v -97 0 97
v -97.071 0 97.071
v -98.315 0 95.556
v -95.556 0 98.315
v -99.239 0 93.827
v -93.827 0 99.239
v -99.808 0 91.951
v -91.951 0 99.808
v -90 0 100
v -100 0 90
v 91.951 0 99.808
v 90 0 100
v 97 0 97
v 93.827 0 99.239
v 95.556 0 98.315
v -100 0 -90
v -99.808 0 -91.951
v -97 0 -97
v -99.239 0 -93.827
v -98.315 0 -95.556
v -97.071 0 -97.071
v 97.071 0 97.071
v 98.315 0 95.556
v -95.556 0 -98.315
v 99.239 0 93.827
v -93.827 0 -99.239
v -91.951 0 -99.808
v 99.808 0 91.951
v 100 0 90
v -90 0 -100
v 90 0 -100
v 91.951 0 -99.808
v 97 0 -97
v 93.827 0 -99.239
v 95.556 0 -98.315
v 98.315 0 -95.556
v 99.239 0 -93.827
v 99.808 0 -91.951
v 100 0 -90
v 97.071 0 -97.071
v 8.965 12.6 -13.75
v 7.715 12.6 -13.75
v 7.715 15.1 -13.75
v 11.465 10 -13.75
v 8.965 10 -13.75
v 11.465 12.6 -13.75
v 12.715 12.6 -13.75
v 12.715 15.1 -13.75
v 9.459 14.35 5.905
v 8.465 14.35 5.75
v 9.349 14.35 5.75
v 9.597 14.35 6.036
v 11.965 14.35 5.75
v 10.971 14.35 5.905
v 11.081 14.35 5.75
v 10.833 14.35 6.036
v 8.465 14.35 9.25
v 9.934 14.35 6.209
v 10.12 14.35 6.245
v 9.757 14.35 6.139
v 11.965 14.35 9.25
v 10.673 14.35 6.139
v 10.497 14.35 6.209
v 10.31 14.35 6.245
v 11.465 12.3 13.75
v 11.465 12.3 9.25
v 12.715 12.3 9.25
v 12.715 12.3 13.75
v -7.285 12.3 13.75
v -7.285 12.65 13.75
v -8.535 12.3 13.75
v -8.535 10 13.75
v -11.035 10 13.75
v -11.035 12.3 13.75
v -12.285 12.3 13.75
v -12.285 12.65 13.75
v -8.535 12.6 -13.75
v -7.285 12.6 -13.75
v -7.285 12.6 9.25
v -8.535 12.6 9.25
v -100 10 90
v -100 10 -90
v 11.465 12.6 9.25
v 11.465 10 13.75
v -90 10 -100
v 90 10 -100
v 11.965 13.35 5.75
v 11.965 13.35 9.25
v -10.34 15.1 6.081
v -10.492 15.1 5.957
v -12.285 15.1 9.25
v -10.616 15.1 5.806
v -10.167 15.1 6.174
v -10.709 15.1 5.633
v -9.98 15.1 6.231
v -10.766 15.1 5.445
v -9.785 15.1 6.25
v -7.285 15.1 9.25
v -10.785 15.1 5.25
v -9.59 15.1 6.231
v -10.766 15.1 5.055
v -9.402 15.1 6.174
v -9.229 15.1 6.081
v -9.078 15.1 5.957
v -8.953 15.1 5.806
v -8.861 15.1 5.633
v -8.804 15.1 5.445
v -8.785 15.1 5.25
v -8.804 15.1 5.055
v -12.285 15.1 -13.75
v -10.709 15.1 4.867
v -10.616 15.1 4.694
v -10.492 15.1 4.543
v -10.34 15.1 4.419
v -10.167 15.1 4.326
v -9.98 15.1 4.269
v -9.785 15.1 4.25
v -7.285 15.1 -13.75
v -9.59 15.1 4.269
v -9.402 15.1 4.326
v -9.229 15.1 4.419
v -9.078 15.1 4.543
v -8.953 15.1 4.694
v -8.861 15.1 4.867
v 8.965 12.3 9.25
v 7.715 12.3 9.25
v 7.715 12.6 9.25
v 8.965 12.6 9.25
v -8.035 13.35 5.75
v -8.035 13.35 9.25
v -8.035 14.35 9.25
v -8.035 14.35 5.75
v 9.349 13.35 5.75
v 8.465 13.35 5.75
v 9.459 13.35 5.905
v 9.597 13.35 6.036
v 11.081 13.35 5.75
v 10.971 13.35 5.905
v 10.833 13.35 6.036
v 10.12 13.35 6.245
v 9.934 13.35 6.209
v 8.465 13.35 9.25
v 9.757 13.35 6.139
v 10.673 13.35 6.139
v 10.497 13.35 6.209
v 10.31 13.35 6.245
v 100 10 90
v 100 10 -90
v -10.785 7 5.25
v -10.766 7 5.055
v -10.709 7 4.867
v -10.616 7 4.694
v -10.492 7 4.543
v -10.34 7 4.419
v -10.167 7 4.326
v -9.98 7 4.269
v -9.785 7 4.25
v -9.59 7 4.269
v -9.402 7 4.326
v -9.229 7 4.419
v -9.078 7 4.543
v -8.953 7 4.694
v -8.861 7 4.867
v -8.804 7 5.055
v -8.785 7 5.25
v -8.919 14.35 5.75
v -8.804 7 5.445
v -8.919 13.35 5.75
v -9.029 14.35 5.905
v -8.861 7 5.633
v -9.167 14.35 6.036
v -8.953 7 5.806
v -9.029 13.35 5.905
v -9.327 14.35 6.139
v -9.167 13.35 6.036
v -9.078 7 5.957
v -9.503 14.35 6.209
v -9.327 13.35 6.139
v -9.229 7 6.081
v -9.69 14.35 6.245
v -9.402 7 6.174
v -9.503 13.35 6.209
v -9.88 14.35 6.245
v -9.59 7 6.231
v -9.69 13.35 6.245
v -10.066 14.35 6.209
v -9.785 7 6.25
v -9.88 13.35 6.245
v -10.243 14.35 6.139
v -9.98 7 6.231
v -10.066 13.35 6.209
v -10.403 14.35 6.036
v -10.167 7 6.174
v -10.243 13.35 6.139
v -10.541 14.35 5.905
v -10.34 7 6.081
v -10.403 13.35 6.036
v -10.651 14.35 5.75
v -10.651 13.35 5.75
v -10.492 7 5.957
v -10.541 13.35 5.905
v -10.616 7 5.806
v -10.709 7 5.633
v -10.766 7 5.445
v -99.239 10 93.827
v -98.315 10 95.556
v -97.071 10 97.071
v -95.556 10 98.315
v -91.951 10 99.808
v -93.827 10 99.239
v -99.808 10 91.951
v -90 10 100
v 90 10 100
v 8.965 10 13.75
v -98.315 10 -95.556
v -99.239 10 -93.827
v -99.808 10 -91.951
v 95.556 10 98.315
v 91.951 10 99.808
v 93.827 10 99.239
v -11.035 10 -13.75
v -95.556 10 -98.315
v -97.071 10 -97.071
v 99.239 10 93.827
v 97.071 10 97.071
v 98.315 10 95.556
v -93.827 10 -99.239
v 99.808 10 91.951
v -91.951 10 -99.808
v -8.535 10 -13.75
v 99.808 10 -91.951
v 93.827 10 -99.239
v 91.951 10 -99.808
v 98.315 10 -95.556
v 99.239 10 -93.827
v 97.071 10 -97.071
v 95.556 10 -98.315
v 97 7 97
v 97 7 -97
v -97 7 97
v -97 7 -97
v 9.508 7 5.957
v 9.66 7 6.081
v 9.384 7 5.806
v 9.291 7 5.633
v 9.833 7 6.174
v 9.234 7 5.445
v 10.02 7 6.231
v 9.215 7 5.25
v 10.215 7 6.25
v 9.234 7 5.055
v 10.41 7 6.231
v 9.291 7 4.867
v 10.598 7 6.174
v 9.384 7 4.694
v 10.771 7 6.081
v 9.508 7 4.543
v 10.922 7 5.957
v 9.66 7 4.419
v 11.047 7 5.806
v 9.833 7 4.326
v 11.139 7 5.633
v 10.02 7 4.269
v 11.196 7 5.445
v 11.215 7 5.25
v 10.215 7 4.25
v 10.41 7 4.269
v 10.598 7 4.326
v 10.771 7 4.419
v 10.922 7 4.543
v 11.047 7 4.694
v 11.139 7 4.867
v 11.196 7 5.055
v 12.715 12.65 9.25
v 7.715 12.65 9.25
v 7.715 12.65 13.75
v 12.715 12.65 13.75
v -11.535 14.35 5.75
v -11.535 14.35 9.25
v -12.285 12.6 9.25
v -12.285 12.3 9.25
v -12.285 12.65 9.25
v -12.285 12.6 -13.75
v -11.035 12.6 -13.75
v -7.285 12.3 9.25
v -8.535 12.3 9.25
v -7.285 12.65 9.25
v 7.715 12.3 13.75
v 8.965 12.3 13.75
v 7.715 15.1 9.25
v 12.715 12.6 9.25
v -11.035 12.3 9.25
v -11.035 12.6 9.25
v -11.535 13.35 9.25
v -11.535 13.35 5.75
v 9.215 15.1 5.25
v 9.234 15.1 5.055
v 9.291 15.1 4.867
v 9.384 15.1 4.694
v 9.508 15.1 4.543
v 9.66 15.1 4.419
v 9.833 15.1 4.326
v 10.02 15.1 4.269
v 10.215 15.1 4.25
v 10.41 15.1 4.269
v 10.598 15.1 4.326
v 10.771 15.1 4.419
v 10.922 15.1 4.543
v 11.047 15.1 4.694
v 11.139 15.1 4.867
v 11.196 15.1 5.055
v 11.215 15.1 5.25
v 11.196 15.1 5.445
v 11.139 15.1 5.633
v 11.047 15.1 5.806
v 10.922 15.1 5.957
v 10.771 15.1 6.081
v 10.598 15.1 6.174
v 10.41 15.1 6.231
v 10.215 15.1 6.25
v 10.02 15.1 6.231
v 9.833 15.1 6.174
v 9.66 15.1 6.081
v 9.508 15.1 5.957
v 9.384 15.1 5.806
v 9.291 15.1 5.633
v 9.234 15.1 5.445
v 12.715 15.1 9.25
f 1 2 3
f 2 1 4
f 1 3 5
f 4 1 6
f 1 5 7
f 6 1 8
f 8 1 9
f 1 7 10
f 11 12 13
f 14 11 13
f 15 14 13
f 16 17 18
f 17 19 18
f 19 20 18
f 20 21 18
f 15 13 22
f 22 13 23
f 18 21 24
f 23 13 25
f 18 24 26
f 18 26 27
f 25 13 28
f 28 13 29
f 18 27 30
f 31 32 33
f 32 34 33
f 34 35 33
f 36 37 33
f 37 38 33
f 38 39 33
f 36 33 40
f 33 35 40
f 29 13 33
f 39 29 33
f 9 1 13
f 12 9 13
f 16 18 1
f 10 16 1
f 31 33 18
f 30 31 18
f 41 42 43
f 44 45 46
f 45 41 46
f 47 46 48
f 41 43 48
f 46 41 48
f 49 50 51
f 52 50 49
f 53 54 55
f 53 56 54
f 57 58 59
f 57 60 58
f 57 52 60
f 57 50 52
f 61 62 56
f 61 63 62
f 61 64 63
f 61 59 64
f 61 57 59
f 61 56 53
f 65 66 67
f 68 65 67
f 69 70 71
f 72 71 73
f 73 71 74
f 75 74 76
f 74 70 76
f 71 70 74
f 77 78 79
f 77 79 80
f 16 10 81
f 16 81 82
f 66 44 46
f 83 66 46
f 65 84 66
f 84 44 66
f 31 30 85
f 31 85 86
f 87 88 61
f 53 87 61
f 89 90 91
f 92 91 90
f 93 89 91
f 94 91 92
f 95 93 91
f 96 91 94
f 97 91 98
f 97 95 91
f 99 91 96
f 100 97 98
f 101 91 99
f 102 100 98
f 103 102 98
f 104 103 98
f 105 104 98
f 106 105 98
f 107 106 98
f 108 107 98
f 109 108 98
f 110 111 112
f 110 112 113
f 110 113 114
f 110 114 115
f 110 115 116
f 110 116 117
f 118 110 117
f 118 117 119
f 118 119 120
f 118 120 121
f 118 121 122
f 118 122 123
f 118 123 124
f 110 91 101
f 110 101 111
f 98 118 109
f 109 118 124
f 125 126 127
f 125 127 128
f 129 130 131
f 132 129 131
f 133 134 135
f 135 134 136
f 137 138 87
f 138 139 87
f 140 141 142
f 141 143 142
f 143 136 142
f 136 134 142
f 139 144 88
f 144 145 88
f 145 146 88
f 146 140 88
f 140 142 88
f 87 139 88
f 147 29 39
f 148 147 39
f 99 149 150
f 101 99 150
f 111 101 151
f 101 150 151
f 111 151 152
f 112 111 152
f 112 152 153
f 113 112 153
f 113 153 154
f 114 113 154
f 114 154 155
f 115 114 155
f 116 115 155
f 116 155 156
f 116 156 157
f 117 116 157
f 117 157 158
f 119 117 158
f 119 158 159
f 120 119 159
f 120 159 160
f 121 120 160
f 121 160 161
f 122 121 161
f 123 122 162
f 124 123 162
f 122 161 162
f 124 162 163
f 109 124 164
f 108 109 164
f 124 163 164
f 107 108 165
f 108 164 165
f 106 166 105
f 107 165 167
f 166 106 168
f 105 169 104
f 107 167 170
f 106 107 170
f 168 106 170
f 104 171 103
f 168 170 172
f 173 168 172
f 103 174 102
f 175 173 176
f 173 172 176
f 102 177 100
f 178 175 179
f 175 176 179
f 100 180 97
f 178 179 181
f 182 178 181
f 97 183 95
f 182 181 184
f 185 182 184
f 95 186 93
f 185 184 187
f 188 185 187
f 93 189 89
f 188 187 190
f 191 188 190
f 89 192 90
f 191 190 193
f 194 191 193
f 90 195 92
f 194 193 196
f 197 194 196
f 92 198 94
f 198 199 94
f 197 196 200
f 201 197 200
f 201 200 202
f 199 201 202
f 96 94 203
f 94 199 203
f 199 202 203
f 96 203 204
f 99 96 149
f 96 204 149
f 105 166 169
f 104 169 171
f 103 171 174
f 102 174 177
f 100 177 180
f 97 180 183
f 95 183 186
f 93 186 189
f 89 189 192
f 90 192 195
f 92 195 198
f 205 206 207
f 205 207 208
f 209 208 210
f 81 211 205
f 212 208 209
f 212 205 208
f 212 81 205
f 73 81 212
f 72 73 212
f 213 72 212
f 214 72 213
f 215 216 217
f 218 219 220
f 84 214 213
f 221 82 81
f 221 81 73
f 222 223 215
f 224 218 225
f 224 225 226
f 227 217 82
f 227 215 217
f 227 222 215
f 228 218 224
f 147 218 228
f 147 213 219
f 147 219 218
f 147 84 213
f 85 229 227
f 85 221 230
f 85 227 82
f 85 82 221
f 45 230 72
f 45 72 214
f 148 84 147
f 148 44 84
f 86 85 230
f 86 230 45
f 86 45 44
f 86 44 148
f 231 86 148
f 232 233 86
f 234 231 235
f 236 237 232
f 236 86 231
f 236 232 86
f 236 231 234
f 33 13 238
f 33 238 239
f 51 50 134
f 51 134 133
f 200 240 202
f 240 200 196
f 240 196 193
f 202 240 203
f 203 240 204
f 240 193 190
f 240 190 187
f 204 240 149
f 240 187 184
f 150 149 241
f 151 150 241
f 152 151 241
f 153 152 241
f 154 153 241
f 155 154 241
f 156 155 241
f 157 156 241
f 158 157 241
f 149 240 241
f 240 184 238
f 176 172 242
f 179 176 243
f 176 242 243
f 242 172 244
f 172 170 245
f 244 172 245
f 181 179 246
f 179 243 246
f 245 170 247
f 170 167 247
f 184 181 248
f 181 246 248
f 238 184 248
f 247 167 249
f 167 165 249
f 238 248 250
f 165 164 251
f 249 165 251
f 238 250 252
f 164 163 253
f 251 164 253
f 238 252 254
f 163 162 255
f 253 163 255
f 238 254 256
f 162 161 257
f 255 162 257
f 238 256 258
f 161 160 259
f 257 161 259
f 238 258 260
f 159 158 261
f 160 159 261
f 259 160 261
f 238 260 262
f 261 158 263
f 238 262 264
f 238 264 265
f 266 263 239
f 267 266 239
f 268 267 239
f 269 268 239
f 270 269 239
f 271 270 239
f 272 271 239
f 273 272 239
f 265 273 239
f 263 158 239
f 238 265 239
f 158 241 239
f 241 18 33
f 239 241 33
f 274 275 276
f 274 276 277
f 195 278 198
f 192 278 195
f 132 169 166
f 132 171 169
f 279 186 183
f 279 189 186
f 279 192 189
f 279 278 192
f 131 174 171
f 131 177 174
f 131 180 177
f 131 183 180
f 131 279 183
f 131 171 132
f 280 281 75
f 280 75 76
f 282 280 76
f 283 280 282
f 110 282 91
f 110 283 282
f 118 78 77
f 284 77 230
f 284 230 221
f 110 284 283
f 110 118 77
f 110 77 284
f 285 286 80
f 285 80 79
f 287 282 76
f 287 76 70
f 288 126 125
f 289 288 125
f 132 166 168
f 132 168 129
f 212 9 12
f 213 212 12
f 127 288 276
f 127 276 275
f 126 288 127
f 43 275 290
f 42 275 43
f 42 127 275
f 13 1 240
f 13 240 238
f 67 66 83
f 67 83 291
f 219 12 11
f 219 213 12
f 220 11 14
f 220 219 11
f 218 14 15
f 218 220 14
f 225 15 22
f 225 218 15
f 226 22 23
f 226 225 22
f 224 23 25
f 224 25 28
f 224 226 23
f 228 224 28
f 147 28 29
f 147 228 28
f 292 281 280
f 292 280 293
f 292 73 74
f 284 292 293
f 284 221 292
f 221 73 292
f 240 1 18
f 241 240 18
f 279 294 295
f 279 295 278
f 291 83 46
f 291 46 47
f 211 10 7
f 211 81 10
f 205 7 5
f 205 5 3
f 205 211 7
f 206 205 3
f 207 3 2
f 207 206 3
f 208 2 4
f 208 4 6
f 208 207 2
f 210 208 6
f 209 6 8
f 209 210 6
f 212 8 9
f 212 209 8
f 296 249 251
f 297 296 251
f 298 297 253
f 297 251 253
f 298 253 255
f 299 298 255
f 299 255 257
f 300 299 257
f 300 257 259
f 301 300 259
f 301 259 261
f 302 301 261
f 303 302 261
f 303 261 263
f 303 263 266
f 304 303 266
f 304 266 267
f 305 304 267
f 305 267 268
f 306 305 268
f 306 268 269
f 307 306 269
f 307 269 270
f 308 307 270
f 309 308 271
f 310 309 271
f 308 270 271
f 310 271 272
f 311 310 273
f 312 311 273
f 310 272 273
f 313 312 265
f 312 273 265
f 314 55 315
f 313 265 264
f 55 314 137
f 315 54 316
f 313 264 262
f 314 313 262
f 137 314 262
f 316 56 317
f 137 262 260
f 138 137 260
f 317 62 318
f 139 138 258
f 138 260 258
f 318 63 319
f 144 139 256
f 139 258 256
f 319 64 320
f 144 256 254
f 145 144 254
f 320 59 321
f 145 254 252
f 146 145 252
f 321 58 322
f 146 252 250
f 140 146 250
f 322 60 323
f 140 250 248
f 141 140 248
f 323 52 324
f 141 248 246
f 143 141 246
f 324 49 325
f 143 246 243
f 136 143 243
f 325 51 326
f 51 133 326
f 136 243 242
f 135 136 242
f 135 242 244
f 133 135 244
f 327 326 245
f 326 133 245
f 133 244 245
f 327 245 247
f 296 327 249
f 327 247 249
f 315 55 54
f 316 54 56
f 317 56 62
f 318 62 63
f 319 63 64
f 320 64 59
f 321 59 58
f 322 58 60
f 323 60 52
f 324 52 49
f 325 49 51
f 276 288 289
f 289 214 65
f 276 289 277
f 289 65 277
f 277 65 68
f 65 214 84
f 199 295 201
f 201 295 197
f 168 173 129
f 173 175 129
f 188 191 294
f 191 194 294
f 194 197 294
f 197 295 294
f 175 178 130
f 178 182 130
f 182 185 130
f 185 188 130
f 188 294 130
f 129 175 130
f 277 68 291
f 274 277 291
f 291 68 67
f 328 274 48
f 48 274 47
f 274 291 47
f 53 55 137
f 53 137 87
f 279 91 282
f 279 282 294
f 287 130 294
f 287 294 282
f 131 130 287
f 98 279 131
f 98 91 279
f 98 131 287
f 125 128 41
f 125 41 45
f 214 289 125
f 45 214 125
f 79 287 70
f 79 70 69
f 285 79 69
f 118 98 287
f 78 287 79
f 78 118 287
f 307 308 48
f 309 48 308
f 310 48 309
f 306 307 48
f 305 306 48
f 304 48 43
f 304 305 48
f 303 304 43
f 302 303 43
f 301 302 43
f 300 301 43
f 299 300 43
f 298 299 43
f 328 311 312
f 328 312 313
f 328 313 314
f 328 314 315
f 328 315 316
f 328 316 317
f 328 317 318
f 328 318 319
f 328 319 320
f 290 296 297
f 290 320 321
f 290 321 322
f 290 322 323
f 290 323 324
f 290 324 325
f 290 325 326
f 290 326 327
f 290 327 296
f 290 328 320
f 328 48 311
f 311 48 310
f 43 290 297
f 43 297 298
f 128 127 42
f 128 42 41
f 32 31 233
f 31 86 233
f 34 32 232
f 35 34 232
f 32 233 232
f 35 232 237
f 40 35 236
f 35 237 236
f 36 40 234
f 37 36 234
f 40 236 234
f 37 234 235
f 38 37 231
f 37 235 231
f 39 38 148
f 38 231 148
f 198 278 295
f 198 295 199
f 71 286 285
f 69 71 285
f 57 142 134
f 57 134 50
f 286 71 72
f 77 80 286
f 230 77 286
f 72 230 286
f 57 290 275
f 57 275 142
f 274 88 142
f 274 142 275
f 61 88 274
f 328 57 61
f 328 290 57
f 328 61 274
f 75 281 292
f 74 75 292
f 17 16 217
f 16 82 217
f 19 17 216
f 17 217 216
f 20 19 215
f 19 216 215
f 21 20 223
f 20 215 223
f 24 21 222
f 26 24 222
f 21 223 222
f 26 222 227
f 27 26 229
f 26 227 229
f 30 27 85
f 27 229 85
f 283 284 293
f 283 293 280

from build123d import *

# Parameters (mm, degrees)
SKETCH1_W                = 200
SKETCH1_H                = 200
BOSS_EXTRUDE1_DEPTH      = 10
SHELL5_T                 = -3
BOSS_EXTRUDE2_DEPTH      = 13.75
SKETCH5_W                = 51.63175717
SKETCH5_H                = 2.8
CUT_EXTRUDE1_DEPTH       = 4.5
SKETCH6_W                = 5
SKETCH6_H                = 4.5
BOSS_EXTRUDE3_DEPTH      = 0.35
SKETCH7_W                = 3.5
SKETCH7_H                = 1
CUT_EXTRUDE2_DEPTH       = 3.5
F_2_0_2_DIAMETER_HOLE2_D = 2
FILLET1_R                = 10


with BuildPart() as part:
    # Sketch1 → Boss-Extrude1 (new body)
    with BuildSketch(Plane(origin=(0, 0, 0), x_dir=(1, 0, 0), z_dir=(0, 1, 0))):
        Rectangle(SKETCH1_W, SKETCH1_H)
    extrude(amount=BOSS_EXTRUDE1_DEPTH)

    # Shell5
    shell5_openings = [part.faces().sort_by_distance(p)[0] for p in [
        (0, 0, 0),
    ]]
    offset(amount=SHELL5_T, openings=shell5_openings, kind=Kind.INTERSECTION)

    # Sketch2 → Boss-Extrude2 (add, symmetric)
    with BuildSketch(Plane.XY):
        Polygon((-11.034760645, 10), (-11.034760645, 12.6), (-12.284760645, 12.6), (-12.284760645, 15.1), (-7.284760645, 15.1), (-7.284760645, 12.6), (-8.534760645, 12.6), (-8.534760645, 10), align=None)
        Polygon((8.965239355, 10), (11.465239355, 10), (11.465239355, 12.6), (12.715239355, 12.6), (12.715239355, 15.1), (7.715239355, 15.1), (7.715239355, 12.6), (8.965239355, 12.6), align=None)
    extrude(amount=BOSS_EXTRUDE2_DEPTH, both=True)

    # Sketch5 → Cut-Extrude1 (cut)
    with BuildSketch(Plane.XY.offset(13.75)):
        with Locations((-9.472877717, 13.7)):
            Rectangle(SKETCH5_W, SKETCH5_H)
        with Locations((17.311892559, -46.179704591)):
            Rectangle(SKETCH5_W, SKETCH5_H)
    extrude(amount=-CUT_EXTRUDE1_DEPTH, mode=Mode.SUBTRACT)

    # Sketch6 → Boss-Extrude3 (add)
    with BuildSketch(Plane(origin=(0, 12.3, 0), x_dir=(1, 0, 0), z_dir=(0, 1, 0))):
        with Locations((10.215239355, -11.5)):
            Rectangle(SKETCH6_W, SKETCH6_H)
        with Locations((-9.784760645, -11.5)):
            Rectangle(SKETCH6_W, SKETCH6_H)
    extrude(amount=BOSS_EXTRUDE3_DEPTH)

    # Sketch7 → Cut-Extrude2 (cut)
    with BuildSketch(Plane.XY.offset(9.25)):
        with Locations((10.215239355, 13.85)):
            Rectangle(SKETCH7_W, SKETCH7_H)
        with Locations((-9.784760645, 13.85)):
            Rectangle(SKETCH7_W, SKETCH7_H)
    extrude(amount=-CUT_EXTRUDE2_DEPTH, mode=Mode.SUBTRACT)

    # Ø2.0 (2) Diameter Hole2 (through all)
    with Locations(Plane(origin=(0, 15.1, 0), x_dir=(1, 0, 0), z_dir=(0, 1, 0))):
        with Locations((-9.784760645, -5.25), (10.215239355, -5.25)):
            Hole(F_2_0_2_DIAMETER_HOLE2_D / 2)

    # Fillet1
    fillet1_edges = [part.edges().sort_by_distance(p)[0] for p in [
        (-100, 5, -100),
        (100, 5, -100),
        (100, 5, 100),
        (-100, 5, 100),
    ]]
    fillet(fillet1_edges, radius=FILLET1_R)


solid = part.part
